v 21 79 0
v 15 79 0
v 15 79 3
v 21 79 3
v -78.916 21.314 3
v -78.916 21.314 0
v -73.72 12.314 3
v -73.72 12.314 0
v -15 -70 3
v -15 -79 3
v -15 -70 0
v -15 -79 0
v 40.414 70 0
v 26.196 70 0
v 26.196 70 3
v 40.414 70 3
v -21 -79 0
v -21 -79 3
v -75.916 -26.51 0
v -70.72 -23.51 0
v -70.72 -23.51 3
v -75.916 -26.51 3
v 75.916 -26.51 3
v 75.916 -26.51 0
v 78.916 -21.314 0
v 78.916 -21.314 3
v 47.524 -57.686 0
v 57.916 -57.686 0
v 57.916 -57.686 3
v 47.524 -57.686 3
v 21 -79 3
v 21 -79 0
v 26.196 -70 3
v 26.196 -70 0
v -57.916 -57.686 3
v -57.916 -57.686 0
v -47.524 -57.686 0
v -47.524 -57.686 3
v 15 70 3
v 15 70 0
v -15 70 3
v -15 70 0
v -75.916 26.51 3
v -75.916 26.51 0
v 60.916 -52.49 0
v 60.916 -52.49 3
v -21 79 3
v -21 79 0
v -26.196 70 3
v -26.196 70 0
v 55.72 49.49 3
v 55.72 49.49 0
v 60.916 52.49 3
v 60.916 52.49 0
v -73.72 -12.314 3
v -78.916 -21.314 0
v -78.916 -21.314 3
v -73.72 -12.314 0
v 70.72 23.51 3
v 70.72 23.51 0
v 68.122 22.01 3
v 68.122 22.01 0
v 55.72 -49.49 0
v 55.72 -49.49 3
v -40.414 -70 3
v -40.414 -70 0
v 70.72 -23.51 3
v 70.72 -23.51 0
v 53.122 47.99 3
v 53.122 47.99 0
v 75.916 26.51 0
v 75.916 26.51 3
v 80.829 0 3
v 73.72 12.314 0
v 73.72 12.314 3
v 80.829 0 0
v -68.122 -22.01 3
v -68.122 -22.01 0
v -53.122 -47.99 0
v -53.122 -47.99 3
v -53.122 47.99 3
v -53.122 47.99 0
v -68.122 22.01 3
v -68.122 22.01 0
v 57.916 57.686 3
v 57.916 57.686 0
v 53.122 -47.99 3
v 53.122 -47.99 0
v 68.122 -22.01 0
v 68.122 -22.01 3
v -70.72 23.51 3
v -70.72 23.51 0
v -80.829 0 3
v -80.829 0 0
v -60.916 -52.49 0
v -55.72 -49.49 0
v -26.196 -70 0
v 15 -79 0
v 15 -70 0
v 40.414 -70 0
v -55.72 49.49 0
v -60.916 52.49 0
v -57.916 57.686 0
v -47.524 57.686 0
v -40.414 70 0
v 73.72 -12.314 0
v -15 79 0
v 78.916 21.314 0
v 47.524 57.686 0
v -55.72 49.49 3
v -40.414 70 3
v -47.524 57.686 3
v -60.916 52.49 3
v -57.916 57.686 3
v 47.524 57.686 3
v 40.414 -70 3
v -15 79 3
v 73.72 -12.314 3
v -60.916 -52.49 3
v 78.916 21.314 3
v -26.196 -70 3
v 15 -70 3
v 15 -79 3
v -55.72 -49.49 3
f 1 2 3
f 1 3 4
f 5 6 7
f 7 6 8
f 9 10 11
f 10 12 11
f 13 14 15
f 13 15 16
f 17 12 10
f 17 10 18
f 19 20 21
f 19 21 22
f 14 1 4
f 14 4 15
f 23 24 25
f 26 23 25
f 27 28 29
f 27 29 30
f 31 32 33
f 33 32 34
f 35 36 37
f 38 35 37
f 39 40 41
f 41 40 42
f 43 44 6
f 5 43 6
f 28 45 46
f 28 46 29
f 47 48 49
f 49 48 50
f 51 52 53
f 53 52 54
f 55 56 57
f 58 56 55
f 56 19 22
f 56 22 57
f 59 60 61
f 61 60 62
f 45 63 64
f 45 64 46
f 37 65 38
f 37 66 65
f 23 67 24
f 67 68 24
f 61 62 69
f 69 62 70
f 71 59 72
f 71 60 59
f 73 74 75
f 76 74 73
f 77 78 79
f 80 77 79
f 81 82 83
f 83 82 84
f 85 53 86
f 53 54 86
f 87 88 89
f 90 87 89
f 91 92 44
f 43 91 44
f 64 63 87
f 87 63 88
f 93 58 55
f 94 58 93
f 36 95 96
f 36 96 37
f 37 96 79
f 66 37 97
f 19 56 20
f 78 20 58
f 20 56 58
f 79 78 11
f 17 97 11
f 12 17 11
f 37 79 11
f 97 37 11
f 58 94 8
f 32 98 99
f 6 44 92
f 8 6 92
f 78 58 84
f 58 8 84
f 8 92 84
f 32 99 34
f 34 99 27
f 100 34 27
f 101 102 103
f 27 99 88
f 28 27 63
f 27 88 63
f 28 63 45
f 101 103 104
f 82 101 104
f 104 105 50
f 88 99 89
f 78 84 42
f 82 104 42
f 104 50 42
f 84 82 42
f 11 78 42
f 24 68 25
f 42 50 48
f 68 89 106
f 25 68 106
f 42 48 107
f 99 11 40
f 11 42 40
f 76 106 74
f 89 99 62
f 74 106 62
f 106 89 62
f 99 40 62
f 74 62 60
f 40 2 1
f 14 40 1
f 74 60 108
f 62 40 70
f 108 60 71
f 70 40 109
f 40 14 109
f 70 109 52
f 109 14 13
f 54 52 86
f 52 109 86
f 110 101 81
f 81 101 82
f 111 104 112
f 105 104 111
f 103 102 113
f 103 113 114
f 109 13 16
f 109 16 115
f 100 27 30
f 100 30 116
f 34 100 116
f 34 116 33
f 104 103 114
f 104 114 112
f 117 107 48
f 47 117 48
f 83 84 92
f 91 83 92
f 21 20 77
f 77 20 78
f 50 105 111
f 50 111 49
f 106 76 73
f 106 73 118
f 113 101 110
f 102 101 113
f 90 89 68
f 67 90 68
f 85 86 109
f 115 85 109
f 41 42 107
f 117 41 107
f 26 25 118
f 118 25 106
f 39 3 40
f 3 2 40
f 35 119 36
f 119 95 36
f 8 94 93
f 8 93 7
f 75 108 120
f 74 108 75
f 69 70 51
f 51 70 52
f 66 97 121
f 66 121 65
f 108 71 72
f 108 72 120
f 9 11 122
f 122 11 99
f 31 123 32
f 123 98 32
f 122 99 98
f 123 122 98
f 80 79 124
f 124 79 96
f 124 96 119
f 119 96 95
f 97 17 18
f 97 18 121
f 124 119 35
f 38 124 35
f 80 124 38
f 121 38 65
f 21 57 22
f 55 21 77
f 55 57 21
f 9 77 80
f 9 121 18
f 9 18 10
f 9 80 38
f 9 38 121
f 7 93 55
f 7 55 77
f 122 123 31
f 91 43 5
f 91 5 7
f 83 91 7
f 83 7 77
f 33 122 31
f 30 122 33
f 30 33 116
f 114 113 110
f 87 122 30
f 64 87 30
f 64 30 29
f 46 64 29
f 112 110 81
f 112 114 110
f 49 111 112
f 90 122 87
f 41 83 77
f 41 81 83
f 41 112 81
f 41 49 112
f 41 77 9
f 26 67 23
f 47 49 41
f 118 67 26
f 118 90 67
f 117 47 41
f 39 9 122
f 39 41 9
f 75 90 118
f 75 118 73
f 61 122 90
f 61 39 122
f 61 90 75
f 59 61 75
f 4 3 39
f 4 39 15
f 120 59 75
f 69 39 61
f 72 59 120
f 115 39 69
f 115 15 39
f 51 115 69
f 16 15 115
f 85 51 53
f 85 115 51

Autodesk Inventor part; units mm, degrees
ref_plane "YZ Plane" through (0, 0, 0) normal (1, 0, 0) x (0, 1, 0)
ref_plane "XZ Plane" through (0, 0, 0) normal (0, 1, 0) x (-1, 0, 0)
ref_plane "XY Plane" through (0, 0, 0) normal (0, 0, 1) x (1, 0, 0)
sketch "Sketch1" plane through (0, 0, 0) normal (0, 0, 1) x (1, 0, 0)
  line L0 (-15, 73) -> (15, 73)
  line L1 (15, 73) -> (15, 70)
  line L2 (-15, 70) -> (-15, 73)
  line L3 (-40.4145, 70) -> (-15, 70)
  line L4 (15, 70) -> (40.4145, 70)
  line L5 (-70.7199, 23.5096) -> (-55.7199, 49.4904)
  line L6 (-55.7199, 49.4904) -> (-53.1218, 47.9904)
  line L7 (-68.1218, 22.0096) -> (-70.7199, 23.5096)
  line L8 (-55.7199, -49.4904) -> (-70.7199, -23.5096)
  line L9 (-70.7199, -23.5096) -> (-68.1218, -22.0096)
  line L10 (-53.1218, -47.9904) -> (-55.7199, -49.4904)
  line L11 (15, -73) -> (-15, -73)
  line L12 (-15, -73) -> (-15, -70)
  line L13 (15, -70) -> (15, -73)
  line L14 (70.7199, -23.5096) -> (55.7199, -49.4904)
  line L15 (55.7199, -49.4904) -> (53.1218, -47.9904)
  line L16 (68.1218, -22.0096) -> (70.7199, -23.5096)
  line L17 (55.7199, 49.4904) -> (70.7199, 23.5096)
  line L18 (70.7199, 23.5096) -> (68.1218, 22.0096)
  line L19 (53.1218, 47.9904) -> (55.7199, 49.4904)
  line L20 (-80.829, 0) -> (-68.1218, 22.0096)
  line L21 (-53.1218, 47.9904) -> (-40.4145, 70)
  line L22 (40.4145, 70) -> (53.1218, 47.9904)
  line L23 (68.1218, 22.0096) -> (80.829, 0)
  line L24 (80.829, 0) -> (68.1218, -22.0096)
  line L25 (53.1218, -47.9904) -> (40.4145, -70)
  line L26 (40.4145, -70) -> (15, -70)
  line L27 (-15, -70) -> (-40.4145, -70)
  line L28 (-40.4145, -70) -> (-53.1218, -47.9904)
  line L29 (-68.1218, -22.0096) -> (-80.829, 0)
  line L30 (15, 70) -> (-15, 70)
  line L31 (-53.1218, 47.9904) -> (-68.1218, 22.0096)
  line L32 (-68.1218, -22.0096) -> (-53.1218, -47.9904)
  line L33 (-15, -70) -> (15, -70)
  line L34 (53.1218, -47.9904) -> (68.1218, -22.0096)
  line L35 (68.1218, 22.0096) -> (53.1218, 47.9904)
  line L36 (-15, 73) -> (-15, 79)
  line L37 (-15, 79) -> (-21, 79)
  line L38 (-21, 79) -> (-21, 70)
  line L39 (15, 73) -> (15, 79)
  line L40 (15, 79) -> (21, 79)
  line L41 (21, 79) -> (21, 70)
  line L42 (-55.7199, 49.4904) -> (-60.916, 52.4904)
  line L43 (-57.916, 57.6865) -> (-50.1218, 53.1865)
  line L44 (-60.916, 52.4904) -> (-57.916, 57.6865)
  line L45 (-70.7199, 23.5096) -> (-75.916, 26.5096)
  line L46 (-75.916, 26.5096) -> (-78.916, 21.3135)
  line L47 (-78.916, 21.3135) -> (-71.1218, 16.8135)
  line L48 (-70.7199, -23.5096) -> (-75.916, -26.5096)
  line L49 (-78.916, -21.3135) -> (-71.1218, -16.8135)
  line L50 (-75.916, -26.5096) -> (-78.916, -21.3135)
  line L51 (-55.7199, -49.4904) -> (-60.916, -52.4904)
  line L52 (-60.916, -52.4904) -> (-57.916, -57.6865)
  line L53 (-57.916, -57.6865) -> (-50.1218, -53.1865)
  line L54 (-15, -73) -> (-15, -79)
  line L55 (-21, -79) -> (-21, -70)
  line L56 (-15, -79) -> (-21, -79)
  line L57 (15, -73) -> (15, -79)
  line L58 (15, -79) -> (21, -79)
  line L59 (21, -79) -> (21, -70)
  line L60 (55.7199, -49.4904) -> (60.916, -52.4904)
  line L61 (57.916, -57.6865) -> (50.1218, -53.1865)
  line L62 (60.916, -52.4904) -> (57.916, -57.6865)
  line L63 (70.7199, -23.5096) -> (75.916, -26.5096)
  line L64 (75.916, -26.5096) -> (78.916, -21.3135)
  line L65 (78.916, -21.3135) -> (71.1218, -16.8135)
  line L66 (70.7199, 23.5096) -> (75.916, 26.5096)
  line L67 (78.916, 21.3135) -> (71.1218, 16.8135)
  line L68 (75.916, 26.5096) -> (78.916, 21.3135)
  line L69 (55.7199, 49.4904) -> (60.916, 52.4904)
  line L70 (60.916, 52.4904) -> (57.916, 57.6865)
  line L71 (57.916, 57.6865) -> (50.1218, 53.1865)
  line L72 (-21, 79) -> (-26.1962, 70)
  line L73 (21, 79) -> (26.1962, 70)
  line L74 (-57.916, 57.6865) -> (-47.5237, 57.6865)
  line L75 (-78.916, 21.3135) -> (-73.7199, 12.3135)
  line L76 (-78.916, -21.3135) -> (-73.7199, -12.3135)
  line L77 (-57.916, -57.6865) -> (-47.5237, -57.6865)
  line L78 (-21, -79) -> (-26.1962, -70)
  line L79 (21, -79) -> (26.1962, -70)
  line L80 (57.916, -57.6865) -> (47.5237, -57.6865)
  line L81 (78.916, -21.3135) -> (73.7199, -12.3135)
  line L82 (78.916, 21.3135) -> (73.7199, 12.3135)
  line L83 (57.916, 57.6865) -> (47.5237, 57.6865)
  point P0 (0, 0)
  point P1 (0, 0)
  point P2 (0, 73)
  point P3 (-63.2199, 36.5)
  point P4 (-63.2199, -36.5)
  point P5 (0, -73)
  point P6 (63.2199, -36.5)
  point P7 (63.2199, 36.5)
  point P8 (71.1218, 16.8135)
  point P9 (50.1218, -53.1865)
  point P10 (71.1218, -16.8135)
  point P11 (21, -70)
  point P12 (-71.1218, -16.8135)
  point P13 (-50.1218, -53.1865)
  point P14 (-71.1218, 16.8135)
  point P15 (-50.1218, 53.1865)
  point P16 (-47.5237, 57.6865)
  point P17 (-73.7199, 12.3135)
  point P18 (-73.7199, -12.3135)
  point P19 (-47.5237, -57.6865)
  point P20 (-26.1962, -70)
  point P21 (26.1962, -70)
  point P22 (47.5237, -57.6865)
  point P23 (73.7199, -12.3135)
  point P24 (73.7199, 12.3135)
  point P25 (47.5237, 57.6865)
  dimension "d1" = 3
  dimension "d3" = 30
  dimension "d6" = 360
  dimension "d8" = 140
  dimension "d9" = 146
  dimension "d14" = 360
  dimension "d16" = 6
  dimension "d17" = 6
  dimension "d18" = 6
  dimension "d19" = 6
  dimension "d22" = 360
  dimension "d24" = 60
  dimension "d25" = 60
  dimension "d28" = 360
extrude "Extrusion1" add sketch "Sketch1" along normal blind 3 contours L2 L3 L38 L37 L36 | L39 L40 L41 L4 L1 | L30 L4 L22 L35 L23 L24 L34 L25 L26 L33 L27 L28 L32 L29 L20 L31 L21 L3 | L3 L72 L38 | L41 L73 L4 | L21 L43 L74 | L83 L71 L22 | L21 L6 L42 L44 L43 | L71 L70 L69 L19 L22 | L20 L47 L46 L45 L7 | L18 L66 L68 L67 L23 | L20 L75 L47 | L67 L82 L23 | L29 L49 L76 | L81 L65 L24 | L29 L9 L48 L50 L49 | L65 L64 L63 L16 L24 | L28 L53 L52 L51 L10 | L15 L60 L62 L61 L25 | L28 L77 L53 | L61 L80 L25 | L27 L55 L78 | L79 L59 L26 | L27 L12 L54 L56 L55 | L59 L58 L57 L13 L26
properties material "MDF Medium Density Fiberboard"
